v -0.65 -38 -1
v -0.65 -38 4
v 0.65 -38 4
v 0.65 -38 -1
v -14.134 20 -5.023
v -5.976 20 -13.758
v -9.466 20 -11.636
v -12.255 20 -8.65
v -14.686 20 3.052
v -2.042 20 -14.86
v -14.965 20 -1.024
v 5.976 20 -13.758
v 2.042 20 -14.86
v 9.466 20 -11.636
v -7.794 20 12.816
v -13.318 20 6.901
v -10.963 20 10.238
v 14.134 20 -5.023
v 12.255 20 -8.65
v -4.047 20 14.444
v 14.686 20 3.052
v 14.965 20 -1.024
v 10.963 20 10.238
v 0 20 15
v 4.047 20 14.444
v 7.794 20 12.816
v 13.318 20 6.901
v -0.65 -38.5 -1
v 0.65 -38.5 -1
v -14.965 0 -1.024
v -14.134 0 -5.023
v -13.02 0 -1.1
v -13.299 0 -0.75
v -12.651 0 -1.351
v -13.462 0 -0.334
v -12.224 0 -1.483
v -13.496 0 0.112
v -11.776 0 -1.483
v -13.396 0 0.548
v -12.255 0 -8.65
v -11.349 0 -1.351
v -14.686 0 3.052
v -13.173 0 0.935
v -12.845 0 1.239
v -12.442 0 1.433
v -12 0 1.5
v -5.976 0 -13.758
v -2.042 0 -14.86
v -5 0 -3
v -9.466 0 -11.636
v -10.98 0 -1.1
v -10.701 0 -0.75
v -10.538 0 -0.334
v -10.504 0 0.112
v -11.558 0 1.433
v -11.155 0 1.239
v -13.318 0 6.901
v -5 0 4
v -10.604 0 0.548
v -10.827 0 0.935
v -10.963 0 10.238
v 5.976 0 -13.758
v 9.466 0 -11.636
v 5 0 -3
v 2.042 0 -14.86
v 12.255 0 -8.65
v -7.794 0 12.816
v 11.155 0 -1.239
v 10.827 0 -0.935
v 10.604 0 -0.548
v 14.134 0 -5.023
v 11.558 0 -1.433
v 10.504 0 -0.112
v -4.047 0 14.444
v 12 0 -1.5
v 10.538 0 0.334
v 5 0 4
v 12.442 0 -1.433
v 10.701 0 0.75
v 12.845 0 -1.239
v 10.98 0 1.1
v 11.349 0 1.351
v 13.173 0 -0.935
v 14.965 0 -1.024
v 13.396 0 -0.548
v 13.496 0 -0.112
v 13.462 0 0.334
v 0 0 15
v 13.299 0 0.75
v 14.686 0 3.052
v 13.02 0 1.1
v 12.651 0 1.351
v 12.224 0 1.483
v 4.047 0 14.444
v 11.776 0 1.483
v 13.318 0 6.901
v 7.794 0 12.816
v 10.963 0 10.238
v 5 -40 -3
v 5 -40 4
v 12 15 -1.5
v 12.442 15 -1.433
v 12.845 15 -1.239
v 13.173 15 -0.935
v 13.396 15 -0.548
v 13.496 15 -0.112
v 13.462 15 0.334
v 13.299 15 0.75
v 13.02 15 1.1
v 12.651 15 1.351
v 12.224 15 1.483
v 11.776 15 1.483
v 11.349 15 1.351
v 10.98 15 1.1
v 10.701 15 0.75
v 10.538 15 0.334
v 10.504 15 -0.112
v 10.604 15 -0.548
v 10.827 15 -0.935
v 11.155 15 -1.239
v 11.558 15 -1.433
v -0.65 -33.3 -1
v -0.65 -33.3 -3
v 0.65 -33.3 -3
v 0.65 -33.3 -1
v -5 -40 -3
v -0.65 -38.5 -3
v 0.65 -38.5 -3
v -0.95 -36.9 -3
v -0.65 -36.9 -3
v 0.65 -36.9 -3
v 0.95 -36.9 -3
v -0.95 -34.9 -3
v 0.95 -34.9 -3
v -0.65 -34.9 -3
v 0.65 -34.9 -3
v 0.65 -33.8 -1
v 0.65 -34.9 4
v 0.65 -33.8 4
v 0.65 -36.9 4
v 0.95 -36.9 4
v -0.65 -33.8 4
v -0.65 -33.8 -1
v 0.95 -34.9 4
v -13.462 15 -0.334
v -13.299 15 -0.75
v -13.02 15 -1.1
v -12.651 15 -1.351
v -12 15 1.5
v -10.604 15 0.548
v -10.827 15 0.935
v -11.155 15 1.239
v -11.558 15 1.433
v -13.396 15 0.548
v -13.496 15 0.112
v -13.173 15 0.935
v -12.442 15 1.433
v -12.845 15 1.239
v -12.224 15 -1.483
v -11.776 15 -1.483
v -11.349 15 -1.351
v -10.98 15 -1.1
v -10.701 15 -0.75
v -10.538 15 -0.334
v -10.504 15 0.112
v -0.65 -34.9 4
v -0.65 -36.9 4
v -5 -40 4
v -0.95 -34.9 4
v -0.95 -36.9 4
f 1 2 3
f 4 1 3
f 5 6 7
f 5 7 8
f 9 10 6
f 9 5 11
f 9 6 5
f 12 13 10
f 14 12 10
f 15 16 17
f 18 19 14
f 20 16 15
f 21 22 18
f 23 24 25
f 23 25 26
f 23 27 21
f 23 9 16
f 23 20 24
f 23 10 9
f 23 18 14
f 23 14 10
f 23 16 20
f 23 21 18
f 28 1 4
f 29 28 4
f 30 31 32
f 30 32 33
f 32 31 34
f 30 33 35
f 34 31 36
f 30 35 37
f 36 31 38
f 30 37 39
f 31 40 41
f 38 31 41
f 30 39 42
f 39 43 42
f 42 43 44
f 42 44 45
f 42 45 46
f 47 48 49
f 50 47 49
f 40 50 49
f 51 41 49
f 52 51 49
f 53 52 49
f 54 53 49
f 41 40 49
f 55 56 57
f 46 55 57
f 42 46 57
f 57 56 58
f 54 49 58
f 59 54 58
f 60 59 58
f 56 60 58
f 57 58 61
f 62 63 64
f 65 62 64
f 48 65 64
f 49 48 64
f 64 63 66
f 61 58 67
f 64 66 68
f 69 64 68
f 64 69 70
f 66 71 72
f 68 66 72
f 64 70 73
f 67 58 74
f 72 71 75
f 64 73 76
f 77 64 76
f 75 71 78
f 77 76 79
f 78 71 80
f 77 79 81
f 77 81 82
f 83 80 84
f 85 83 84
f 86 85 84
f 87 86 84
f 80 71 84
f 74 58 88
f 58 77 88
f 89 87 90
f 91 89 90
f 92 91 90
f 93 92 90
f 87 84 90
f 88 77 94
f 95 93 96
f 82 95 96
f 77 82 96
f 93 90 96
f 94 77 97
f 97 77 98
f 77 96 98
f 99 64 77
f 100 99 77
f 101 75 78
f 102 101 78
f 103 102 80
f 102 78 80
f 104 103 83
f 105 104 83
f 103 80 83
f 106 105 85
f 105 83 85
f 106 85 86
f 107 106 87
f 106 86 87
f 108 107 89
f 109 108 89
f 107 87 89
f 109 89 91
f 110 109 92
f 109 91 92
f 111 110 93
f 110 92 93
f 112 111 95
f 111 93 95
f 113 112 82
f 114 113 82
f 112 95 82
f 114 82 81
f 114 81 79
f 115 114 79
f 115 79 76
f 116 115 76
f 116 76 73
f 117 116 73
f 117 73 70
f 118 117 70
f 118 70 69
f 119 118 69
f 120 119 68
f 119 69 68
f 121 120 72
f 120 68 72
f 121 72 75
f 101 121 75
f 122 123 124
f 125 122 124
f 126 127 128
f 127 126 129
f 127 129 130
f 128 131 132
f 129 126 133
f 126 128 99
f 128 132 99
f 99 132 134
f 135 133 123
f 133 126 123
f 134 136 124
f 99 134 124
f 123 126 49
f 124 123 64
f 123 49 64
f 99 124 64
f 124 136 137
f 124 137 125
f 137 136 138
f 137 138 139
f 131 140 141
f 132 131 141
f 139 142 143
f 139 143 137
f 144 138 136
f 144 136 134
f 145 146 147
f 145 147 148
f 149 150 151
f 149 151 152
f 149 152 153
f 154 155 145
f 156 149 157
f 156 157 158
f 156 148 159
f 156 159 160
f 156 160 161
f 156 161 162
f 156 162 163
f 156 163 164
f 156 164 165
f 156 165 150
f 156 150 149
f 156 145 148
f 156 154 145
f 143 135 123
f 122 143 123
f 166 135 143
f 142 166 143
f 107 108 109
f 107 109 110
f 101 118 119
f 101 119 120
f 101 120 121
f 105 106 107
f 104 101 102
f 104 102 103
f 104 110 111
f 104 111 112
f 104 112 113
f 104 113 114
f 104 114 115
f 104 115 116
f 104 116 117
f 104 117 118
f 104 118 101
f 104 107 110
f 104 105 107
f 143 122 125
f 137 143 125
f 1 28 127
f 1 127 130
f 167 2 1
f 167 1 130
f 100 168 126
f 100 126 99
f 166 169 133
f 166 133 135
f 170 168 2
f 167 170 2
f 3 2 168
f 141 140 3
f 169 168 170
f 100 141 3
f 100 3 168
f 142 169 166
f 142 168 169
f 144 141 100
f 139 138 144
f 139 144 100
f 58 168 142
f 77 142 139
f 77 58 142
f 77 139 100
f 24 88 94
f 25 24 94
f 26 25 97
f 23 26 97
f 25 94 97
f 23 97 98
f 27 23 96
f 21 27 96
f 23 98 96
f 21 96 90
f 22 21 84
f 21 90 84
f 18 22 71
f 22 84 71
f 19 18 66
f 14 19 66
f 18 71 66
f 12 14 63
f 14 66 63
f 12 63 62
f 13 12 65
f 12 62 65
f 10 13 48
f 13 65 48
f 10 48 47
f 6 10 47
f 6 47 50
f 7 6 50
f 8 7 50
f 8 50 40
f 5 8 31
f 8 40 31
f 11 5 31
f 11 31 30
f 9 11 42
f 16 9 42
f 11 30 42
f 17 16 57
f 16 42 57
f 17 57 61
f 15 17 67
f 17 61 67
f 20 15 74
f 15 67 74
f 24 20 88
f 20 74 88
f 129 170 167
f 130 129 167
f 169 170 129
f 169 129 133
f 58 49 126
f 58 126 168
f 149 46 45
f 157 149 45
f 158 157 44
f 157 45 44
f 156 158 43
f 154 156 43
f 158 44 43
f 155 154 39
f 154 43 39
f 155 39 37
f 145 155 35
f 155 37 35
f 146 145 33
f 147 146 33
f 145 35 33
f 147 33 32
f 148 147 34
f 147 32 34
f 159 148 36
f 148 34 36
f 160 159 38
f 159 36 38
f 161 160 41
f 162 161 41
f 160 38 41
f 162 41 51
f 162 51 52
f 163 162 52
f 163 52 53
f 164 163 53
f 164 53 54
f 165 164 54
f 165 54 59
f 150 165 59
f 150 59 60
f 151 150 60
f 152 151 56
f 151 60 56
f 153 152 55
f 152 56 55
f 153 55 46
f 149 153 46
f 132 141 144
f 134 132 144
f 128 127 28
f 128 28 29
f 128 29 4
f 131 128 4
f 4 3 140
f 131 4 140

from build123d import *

# Parameters (mm, degrees)
SKETCH_1_R          = 15
EXTRUDE_1_DEPTH     = 20
SKETCH_2_R          = 1.5
CUT_EXTRUDE_1_DEPTH = 15
SKETCH_3_W          = 10
SKETCH_3_H          = 7
EXTRUDE_2_DEPTH     = 40
SKETCH_4_W          = 1.3
SKETCH_4_H          = 4.2
CUT_EXTRUDE_2_DEPTH = 47.75467891
SKETCH_5_W          = 1.3
SKETCH_5_H          = 5.2
CUT_EXTRUDE_3_DEPTH = 2
SKETCH_6_W          = 1.9
SKETCH_6_H          = 2
CUT_EXTRUDE_4_DEPTH = 47.75467891


with BuildPart() as part:
    # 草图1 → 凸台-拉伸1 (new body)
    with BuildSketch(Plane(origin=(0, 0, 0), x_dir=(1, 0, 0), z_dir=(0, 1, 0))):
        with Locations(Location((0, 0, 0), (0, 0, 270))):
            Circle(SKETCH_1_R)
    extrude(amount=EXTRUDE_1_DEPTH)

    # 草图2 → 切除-拉伸1 (cut)
    with BuildSketch(Plane.XZ):
        with Locations(Location((12, 0, 0), (0, 0, 270))):
            Circle(SKETCH_2_R)
        with Locations(Location((-12, 0, 0), (0, 0, 90))):
            Circle(SKETCH_2_R)
    extrude(amount=-CUT_EXTRUDE_1_DEPTH, mode=Mode.SUBTRACT)

    # 草图3 → 凸台-拉伸2 (add)
    with BuildSketch(Plane.XZ):
        with Locations((0, 0.5)):
            Rectangle(SKETCH_3_W, SKETCH_3_H)
    extrude(amount=EXTRUDE_2_DEPTH)

    # 草图4 → 切除-拉伸2 (cut, through all)
    with BuildSketch(Plane.XY.offset(4)):
        with Locations((0, -35.9)):
            Rectangle(SKETCH_4_W, SKETCH_4_H)
    extrude(amount=-CUT_EXTRUDE_2_DEPTH, mode=Mode.SUBTRACT)

    # 草图5 → 切除-拉伸3 (cut)
    with BuildSketch(Plane.XY.offset(-3)):
        with Locations((0, -35.9)):
            Rectangle(SKETCH_5_W, SKETCH_5_H)
    extrude(amount=CUT_EXTRUDE_3_DEPTH, mode=Mode.SUBTRACT)

    # 草图6 → 切除-拉伸4 (cut, through all)
    with BuildSketch(Plane.XY.offset(4)):
        with Locations((0, -35.9)):
            Rectangle(SKETCH_6_W, SKETCH_6_H)
    extrude(amount=-CUT_EXTRUDE_4_DEPTH, mode=Mode.SUBTRACT)


solid = part.part
